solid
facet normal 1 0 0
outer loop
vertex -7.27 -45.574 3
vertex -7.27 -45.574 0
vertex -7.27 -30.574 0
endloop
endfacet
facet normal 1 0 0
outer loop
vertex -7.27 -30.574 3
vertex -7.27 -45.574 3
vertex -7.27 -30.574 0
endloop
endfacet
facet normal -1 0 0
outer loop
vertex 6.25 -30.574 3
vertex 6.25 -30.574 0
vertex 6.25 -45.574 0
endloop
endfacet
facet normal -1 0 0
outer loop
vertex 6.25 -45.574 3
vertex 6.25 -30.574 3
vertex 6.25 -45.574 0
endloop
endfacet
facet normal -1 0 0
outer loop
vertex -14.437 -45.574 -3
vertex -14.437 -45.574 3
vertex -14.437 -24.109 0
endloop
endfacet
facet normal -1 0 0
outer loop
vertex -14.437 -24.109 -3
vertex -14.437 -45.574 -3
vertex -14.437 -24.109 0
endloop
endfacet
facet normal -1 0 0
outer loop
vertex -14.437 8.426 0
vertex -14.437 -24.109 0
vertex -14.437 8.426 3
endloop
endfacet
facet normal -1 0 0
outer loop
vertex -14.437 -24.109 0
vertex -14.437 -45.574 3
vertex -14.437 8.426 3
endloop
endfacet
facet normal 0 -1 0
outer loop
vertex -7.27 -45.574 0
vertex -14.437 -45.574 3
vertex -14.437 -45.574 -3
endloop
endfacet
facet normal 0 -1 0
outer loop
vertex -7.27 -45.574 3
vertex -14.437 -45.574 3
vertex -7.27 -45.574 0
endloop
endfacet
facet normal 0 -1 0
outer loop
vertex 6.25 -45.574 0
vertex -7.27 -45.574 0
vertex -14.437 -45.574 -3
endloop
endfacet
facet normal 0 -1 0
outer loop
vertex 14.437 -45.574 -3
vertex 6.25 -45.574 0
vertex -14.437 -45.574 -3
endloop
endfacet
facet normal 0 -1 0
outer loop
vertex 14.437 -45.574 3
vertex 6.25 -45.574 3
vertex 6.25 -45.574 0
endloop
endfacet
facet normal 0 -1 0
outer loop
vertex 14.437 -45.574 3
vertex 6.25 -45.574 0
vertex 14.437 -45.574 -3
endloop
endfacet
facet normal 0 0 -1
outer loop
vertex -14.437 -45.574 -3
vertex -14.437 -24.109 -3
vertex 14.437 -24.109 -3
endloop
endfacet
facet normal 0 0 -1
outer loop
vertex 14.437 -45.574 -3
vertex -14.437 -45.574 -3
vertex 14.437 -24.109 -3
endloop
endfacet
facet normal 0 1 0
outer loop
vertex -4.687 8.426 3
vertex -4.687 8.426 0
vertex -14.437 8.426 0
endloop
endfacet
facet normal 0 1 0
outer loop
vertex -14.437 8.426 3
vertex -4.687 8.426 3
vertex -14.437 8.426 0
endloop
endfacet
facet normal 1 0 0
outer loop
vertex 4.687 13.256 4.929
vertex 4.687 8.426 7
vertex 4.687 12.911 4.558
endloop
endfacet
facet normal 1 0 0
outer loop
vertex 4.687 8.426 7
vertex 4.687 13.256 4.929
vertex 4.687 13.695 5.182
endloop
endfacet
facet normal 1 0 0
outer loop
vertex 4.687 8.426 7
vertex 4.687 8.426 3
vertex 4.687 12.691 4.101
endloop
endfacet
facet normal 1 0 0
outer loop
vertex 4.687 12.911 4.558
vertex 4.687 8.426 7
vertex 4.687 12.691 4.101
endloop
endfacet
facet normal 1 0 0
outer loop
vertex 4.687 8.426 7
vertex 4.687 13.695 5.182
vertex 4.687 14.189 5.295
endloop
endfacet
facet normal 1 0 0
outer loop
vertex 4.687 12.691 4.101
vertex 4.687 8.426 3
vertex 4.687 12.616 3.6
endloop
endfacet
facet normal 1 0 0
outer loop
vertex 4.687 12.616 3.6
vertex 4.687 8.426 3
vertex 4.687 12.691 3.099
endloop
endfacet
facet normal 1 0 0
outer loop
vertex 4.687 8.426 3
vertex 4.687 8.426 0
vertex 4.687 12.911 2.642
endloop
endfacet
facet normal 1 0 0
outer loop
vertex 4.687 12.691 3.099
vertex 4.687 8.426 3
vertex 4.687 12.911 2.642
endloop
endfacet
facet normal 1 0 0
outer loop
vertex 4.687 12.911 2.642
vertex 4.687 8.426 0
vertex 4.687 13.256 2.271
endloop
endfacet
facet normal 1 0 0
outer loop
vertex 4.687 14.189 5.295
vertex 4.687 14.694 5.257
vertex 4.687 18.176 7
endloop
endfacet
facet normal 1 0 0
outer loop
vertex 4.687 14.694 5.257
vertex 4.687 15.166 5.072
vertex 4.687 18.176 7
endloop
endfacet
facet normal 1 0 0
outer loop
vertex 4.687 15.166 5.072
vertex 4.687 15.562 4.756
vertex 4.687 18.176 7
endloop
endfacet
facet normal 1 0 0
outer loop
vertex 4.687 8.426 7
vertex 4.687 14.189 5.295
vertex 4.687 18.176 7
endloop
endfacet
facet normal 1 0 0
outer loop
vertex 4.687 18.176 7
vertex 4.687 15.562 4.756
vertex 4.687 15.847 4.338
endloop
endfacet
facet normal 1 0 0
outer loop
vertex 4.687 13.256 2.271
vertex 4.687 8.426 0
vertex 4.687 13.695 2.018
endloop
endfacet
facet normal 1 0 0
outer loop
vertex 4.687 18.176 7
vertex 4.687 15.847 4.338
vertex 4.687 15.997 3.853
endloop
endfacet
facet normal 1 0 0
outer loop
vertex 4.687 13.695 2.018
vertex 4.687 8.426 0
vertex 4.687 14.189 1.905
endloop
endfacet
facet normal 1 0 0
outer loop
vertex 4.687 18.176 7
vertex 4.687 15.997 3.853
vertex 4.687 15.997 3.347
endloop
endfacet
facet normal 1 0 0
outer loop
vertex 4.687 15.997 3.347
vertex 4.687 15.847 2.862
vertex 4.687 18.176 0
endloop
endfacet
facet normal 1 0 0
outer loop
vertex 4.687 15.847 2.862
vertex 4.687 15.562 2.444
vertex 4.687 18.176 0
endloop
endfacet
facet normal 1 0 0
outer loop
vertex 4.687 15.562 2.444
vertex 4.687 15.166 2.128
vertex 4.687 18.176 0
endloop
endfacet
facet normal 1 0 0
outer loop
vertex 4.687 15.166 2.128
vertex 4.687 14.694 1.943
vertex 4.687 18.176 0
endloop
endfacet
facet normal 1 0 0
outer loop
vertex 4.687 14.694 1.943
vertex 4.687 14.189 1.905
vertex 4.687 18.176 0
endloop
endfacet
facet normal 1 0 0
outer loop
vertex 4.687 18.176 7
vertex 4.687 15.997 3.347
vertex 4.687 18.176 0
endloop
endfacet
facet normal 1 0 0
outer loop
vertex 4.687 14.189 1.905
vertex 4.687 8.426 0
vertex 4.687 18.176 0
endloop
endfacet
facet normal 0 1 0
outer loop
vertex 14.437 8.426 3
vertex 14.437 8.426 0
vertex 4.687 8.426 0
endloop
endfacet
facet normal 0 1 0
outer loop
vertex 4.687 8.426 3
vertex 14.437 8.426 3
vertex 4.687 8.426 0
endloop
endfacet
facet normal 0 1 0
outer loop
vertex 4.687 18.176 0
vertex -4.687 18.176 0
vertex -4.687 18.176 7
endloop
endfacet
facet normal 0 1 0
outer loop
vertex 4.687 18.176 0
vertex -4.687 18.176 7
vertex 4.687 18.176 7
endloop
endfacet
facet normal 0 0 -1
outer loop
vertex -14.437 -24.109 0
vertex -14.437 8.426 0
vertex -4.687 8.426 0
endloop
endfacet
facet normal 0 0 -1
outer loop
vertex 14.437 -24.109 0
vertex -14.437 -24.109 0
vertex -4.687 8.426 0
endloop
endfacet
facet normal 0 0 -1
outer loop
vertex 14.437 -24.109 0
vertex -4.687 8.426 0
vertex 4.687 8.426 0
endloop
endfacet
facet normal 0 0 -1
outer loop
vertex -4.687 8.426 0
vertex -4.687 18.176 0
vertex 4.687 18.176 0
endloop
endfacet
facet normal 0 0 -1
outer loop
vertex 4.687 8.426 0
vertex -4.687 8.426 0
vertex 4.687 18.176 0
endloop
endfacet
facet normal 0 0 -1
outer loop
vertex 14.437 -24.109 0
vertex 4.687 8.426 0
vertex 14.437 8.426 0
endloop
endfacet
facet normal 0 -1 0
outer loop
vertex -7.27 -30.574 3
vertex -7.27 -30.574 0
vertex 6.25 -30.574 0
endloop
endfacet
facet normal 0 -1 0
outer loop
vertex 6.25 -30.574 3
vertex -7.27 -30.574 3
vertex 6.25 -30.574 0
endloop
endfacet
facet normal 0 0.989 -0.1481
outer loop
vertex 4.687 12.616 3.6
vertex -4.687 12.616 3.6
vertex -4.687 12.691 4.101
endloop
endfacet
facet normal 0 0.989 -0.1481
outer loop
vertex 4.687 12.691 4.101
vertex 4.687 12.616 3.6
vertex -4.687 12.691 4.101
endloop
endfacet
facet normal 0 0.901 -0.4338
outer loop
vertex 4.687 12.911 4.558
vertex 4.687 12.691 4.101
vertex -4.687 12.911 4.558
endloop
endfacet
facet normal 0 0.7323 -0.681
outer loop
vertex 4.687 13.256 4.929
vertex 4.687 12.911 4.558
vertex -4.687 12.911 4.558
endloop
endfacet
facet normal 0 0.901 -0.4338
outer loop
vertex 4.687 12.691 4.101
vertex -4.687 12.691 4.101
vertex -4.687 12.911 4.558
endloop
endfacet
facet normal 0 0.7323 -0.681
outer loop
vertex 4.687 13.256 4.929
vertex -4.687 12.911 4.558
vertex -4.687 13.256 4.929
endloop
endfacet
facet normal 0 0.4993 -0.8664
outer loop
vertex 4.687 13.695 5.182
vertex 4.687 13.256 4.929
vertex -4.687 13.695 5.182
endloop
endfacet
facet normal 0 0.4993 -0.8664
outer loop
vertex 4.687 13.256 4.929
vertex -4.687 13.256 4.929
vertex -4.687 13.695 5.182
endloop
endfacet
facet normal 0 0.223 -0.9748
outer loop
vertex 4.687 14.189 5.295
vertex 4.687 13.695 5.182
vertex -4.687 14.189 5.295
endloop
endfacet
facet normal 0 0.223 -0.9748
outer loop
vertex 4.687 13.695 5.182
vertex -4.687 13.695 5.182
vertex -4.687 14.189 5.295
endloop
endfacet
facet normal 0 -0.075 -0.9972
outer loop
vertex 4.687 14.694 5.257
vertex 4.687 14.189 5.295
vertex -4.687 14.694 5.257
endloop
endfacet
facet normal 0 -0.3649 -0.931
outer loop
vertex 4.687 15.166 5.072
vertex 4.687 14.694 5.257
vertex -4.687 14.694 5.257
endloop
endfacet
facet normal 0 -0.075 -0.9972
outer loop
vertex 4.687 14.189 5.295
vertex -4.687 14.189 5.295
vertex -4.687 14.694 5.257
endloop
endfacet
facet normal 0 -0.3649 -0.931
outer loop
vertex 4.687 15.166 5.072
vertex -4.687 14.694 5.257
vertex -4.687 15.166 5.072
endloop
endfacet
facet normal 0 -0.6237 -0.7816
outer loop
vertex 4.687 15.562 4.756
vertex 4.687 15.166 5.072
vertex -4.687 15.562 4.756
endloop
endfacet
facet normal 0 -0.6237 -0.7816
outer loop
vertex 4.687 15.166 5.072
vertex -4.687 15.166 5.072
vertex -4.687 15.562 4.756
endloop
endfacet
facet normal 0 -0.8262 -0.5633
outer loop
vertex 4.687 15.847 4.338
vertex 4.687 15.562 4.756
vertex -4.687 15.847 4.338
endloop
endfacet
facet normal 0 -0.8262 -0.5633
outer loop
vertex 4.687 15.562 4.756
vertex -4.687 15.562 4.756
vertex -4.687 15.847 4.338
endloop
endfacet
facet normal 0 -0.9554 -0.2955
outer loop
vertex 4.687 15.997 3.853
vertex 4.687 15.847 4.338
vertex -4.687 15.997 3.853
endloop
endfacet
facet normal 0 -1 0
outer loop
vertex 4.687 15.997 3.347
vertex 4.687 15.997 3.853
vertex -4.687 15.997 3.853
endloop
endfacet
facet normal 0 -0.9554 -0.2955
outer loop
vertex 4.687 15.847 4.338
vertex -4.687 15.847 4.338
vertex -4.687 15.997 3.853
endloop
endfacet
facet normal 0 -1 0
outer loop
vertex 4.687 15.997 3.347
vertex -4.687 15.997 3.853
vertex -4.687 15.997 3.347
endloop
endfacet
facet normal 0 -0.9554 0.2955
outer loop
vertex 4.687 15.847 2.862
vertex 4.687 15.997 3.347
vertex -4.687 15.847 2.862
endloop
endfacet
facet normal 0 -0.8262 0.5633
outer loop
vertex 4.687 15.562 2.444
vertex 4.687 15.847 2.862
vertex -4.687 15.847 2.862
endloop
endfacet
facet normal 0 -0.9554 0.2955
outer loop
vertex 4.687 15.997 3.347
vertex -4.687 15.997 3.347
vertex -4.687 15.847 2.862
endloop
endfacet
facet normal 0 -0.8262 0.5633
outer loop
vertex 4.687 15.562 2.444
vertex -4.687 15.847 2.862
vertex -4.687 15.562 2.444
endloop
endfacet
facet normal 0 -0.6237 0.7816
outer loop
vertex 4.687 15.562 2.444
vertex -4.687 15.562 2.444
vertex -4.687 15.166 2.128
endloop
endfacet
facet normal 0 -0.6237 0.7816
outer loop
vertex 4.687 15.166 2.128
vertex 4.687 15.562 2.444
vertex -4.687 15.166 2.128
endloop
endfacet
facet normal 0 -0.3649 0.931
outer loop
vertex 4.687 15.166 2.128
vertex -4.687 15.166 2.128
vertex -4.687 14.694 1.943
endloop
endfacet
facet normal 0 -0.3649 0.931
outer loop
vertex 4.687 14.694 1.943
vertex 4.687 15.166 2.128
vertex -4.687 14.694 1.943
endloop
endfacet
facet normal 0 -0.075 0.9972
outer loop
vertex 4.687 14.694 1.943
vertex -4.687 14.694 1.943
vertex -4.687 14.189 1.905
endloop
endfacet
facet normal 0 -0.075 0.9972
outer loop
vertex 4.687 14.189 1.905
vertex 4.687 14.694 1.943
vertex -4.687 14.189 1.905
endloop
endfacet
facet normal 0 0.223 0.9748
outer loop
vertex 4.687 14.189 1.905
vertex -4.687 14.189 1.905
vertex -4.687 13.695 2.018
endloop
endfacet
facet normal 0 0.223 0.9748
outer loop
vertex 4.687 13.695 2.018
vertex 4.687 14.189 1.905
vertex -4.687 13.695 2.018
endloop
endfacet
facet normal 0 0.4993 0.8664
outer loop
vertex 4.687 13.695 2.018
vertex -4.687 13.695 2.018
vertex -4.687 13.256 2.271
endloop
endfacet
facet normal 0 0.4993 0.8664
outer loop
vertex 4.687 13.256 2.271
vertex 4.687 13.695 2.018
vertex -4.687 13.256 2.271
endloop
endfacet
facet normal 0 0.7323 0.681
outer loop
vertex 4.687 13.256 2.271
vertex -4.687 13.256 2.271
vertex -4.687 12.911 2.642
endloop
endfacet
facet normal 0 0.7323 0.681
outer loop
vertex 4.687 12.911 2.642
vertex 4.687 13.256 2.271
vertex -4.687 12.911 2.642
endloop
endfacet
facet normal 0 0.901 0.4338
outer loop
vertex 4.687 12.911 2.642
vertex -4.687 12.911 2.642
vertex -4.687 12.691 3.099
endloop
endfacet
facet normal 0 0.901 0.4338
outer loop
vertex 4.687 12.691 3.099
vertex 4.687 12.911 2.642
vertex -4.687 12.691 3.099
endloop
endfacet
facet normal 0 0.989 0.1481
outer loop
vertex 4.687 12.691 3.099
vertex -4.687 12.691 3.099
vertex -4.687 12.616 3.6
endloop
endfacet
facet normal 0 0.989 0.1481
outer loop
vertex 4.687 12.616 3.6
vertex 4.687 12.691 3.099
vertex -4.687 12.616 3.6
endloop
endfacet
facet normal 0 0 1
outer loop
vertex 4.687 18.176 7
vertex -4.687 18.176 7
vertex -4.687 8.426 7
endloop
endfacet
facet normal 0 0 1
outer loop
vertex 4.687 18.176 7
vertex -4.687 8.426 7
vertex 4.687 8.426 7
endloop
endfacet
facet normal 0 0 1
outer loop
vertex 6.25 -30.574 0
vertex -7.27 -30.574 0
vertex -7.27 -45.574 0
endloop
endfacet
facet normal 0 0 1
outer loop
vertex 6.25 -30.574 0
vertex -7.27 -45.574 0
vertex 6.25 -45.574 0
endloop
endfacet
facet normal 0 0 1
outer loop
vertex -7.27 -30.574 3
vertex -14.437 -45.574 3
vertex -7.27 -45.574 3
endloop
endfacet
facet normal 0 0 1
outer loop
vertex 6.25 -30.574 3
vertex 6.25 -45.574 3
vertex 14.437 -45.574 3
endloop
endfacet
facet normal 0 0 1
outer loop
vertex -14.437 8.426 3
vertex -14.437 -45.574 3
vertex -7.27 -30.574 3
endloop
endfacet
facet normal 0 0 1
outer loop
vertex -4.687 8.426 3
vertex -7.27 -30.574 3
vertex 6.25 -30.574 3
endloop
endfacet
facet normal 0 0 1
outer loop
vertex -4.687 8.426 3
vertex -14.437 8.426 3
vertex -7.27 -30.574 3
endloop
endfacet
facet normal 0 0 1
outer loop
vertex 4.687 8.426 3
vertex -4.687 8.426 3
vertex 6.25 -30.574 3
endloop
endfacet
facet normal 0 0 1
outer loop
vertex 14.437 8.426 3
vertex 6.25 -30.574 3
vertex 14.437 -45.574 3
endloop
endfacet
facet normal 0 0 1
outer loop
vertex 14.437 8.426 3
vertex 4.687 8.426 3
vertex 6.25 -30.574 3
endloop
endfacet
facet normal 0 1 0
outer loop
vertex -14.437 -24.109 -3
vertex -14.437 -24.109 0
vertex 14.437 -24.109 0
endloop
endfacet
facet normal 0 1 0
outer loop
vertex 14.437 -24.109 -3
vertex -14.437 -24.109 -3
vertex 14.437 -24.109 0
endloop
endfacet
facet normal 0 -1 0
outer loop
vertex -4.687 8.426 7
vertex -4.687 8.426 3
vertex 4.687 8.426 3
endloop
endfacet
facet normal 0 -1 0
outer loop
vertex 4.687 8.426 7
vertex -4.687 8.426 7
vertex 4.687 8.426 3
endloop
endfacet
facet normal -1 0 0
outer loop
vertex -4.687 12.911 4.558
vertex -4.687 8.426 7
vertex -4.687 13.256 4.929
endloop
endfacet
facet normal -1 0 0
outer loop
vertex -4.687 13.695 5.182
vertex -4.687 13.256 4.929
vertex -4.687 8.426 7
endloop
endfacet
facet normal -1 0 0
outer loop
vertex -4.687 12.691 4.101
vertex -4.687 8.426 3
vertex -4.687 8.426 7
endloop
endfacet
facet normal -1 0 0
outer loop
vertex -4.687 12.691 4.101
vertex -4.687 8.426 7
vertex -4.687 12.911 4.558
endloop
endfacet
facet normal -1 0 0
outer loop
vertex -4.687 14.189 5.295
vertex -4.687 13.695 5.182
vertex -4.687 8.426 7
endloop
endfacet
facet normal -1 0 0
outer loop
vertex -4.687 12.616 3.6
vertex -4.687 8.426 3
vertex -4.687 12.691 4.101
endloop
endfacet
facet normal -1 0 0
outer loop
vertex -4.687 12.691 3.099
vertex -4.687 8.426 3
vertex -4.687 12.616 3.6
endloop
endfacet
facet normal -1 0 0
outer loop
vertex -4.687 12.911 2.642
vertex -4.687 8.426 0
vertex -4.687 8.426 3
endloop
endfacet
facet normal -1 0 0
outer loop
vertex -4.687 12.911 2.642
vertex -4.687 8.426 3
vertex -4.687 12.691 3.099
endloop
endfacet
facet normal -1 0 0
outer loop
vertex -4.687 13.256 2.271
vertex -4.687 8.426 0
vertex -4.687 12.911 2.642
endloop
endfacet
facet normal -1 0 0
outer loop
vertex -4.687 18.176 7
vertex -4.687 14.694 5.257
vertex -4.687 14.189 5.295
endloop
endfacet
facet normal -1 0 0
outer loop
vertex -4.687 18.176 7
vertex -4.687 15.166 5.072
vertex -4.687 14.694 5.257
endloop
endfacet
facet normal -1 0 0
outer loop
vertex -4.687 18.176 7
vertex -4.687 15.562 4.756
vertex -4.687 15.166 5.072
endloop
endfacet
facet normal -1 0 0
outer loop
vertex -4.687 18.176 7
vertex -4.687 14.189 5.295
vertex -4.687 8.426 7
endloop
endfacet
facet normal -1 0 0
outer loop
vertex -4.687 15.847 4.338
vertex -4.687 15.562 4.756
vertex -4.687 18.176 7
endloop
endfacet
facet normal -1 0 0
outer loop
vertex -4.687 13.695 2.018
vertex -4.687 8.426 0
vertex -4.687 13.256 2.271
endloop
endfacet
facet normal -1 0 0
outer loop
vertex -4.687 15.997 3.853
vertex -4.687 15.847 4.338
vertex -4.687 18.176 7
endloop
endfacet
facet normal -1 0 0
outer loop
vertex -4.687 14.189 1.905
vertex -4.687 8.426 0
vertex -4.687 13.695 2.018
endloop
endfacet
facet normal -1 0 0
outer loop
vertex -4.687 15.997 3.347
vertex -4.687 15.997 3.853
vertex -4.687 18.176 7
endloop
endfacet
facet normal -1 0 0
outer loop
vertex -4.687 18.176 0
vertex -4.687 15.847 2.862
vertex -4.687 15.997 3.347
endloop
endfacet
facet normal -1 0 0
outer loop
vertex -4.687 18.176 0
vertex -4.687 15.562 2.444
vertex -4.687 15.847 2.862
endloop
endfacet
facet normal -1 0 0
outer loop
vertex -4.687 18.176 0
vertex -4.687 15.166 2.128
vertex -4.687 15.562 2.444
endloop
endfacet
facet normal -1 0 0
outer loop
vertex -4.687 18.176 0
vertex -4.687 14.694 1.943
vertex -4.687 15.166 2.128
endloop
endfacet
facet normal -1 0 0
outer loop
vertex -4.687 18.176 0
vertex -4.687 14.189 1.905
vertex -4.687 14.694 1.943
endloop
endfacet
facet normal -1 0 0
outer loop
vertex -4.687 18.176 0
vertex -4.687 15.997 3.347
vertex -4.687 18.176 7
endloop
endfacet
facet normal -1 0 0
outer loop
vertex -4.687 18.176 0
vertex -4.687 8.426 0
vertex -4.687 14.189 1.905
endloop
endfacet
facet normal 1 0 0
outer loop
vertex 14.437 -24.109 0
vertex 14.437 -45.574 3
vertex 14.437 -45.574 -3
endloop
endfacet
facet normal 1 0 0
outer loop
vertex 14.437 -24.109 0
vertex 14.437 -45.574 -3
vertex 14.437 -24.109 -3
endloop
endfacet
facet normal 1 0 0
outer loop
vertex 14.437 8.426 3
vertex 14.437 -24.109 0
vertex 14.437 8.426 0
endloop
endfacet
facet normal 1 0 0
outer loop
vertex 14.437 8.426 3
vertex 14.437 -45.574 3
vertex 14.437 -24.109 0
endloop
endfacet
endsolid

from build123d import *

# Parameters (mm, degrees)
BOSS_EXTRUDE1_DEPTH = 3
SKETCH3_W           = 9.37333333
SKETCH3_H           = 9.75
BOSS_EXTRUDE2_DEPTH = 4
SKETCH5_W           = 28.87333333
SKETCH5_H           = 21.46504359
BOSS_EXTRUDE3_DEPTH = 3
SKETCH6_R           = 1.7
CUT_EXTRUDE1_DEPTH  = 10


with BuildPart() as part:
    # Sketch1 → Boss-Extrude1 (new body)
    with BuildSketch(Plane.XY):
        Polygon((-4.686666665, 8.42561874), (-14.436666665, 8.42561874), (-14.436666665, -30.57438126), (-14.436666665, -45.57438126), (-7.270097193, -45.57438126), (-7.270097193, -30.57438126), (6.249902807, -30.57438126), (6.249902807, -45.57438126), (14.436666665, -45.57438126), (14.436666665, -30.57438126), (14.436666665, 8.42561874), (4.686666665, 8.42561874), (4.686666665, 18.17561874), (-4.686666665, 18.17561874), align=None)
    extrude(amount=BOSS_EXTRUDE1_DEPTH)

    # Sketch3 → Boss-Extrude2 (add)
    with BuildSketch(Plane.XY.offset(3)):
        with Locations((0, 13.30061874)):
            Rectangle(SKETCH3_W, SKETCH3_H)
    extrude(amount=BOSS_EXTRUDE2_DEPTH)

    # Sketch5 → Boss-Extrude3 (add)
    with BuildSketch(Plane.XY):
        with Locations((0, -34.841859465)):
            Rectangle(SKETCH5_W, SKETCH5_H)
    extrude(amount=-BOSS_EXTRUDE3_DEPTH)

    # Sketch6 → Cut-Extrude1 (cut)
    with BuildSketch(Plane.ZY.offset(4.686666665)):
        with Locations(Location((3.6, 14.31561874, 0), (0, 0, 270))):
            Circle(SKETCH6_R)
    extrude(amount=-CUT_EXTRUDE1_DEPTH, mode=Mode.SUBTRACT)


solid = part.part
